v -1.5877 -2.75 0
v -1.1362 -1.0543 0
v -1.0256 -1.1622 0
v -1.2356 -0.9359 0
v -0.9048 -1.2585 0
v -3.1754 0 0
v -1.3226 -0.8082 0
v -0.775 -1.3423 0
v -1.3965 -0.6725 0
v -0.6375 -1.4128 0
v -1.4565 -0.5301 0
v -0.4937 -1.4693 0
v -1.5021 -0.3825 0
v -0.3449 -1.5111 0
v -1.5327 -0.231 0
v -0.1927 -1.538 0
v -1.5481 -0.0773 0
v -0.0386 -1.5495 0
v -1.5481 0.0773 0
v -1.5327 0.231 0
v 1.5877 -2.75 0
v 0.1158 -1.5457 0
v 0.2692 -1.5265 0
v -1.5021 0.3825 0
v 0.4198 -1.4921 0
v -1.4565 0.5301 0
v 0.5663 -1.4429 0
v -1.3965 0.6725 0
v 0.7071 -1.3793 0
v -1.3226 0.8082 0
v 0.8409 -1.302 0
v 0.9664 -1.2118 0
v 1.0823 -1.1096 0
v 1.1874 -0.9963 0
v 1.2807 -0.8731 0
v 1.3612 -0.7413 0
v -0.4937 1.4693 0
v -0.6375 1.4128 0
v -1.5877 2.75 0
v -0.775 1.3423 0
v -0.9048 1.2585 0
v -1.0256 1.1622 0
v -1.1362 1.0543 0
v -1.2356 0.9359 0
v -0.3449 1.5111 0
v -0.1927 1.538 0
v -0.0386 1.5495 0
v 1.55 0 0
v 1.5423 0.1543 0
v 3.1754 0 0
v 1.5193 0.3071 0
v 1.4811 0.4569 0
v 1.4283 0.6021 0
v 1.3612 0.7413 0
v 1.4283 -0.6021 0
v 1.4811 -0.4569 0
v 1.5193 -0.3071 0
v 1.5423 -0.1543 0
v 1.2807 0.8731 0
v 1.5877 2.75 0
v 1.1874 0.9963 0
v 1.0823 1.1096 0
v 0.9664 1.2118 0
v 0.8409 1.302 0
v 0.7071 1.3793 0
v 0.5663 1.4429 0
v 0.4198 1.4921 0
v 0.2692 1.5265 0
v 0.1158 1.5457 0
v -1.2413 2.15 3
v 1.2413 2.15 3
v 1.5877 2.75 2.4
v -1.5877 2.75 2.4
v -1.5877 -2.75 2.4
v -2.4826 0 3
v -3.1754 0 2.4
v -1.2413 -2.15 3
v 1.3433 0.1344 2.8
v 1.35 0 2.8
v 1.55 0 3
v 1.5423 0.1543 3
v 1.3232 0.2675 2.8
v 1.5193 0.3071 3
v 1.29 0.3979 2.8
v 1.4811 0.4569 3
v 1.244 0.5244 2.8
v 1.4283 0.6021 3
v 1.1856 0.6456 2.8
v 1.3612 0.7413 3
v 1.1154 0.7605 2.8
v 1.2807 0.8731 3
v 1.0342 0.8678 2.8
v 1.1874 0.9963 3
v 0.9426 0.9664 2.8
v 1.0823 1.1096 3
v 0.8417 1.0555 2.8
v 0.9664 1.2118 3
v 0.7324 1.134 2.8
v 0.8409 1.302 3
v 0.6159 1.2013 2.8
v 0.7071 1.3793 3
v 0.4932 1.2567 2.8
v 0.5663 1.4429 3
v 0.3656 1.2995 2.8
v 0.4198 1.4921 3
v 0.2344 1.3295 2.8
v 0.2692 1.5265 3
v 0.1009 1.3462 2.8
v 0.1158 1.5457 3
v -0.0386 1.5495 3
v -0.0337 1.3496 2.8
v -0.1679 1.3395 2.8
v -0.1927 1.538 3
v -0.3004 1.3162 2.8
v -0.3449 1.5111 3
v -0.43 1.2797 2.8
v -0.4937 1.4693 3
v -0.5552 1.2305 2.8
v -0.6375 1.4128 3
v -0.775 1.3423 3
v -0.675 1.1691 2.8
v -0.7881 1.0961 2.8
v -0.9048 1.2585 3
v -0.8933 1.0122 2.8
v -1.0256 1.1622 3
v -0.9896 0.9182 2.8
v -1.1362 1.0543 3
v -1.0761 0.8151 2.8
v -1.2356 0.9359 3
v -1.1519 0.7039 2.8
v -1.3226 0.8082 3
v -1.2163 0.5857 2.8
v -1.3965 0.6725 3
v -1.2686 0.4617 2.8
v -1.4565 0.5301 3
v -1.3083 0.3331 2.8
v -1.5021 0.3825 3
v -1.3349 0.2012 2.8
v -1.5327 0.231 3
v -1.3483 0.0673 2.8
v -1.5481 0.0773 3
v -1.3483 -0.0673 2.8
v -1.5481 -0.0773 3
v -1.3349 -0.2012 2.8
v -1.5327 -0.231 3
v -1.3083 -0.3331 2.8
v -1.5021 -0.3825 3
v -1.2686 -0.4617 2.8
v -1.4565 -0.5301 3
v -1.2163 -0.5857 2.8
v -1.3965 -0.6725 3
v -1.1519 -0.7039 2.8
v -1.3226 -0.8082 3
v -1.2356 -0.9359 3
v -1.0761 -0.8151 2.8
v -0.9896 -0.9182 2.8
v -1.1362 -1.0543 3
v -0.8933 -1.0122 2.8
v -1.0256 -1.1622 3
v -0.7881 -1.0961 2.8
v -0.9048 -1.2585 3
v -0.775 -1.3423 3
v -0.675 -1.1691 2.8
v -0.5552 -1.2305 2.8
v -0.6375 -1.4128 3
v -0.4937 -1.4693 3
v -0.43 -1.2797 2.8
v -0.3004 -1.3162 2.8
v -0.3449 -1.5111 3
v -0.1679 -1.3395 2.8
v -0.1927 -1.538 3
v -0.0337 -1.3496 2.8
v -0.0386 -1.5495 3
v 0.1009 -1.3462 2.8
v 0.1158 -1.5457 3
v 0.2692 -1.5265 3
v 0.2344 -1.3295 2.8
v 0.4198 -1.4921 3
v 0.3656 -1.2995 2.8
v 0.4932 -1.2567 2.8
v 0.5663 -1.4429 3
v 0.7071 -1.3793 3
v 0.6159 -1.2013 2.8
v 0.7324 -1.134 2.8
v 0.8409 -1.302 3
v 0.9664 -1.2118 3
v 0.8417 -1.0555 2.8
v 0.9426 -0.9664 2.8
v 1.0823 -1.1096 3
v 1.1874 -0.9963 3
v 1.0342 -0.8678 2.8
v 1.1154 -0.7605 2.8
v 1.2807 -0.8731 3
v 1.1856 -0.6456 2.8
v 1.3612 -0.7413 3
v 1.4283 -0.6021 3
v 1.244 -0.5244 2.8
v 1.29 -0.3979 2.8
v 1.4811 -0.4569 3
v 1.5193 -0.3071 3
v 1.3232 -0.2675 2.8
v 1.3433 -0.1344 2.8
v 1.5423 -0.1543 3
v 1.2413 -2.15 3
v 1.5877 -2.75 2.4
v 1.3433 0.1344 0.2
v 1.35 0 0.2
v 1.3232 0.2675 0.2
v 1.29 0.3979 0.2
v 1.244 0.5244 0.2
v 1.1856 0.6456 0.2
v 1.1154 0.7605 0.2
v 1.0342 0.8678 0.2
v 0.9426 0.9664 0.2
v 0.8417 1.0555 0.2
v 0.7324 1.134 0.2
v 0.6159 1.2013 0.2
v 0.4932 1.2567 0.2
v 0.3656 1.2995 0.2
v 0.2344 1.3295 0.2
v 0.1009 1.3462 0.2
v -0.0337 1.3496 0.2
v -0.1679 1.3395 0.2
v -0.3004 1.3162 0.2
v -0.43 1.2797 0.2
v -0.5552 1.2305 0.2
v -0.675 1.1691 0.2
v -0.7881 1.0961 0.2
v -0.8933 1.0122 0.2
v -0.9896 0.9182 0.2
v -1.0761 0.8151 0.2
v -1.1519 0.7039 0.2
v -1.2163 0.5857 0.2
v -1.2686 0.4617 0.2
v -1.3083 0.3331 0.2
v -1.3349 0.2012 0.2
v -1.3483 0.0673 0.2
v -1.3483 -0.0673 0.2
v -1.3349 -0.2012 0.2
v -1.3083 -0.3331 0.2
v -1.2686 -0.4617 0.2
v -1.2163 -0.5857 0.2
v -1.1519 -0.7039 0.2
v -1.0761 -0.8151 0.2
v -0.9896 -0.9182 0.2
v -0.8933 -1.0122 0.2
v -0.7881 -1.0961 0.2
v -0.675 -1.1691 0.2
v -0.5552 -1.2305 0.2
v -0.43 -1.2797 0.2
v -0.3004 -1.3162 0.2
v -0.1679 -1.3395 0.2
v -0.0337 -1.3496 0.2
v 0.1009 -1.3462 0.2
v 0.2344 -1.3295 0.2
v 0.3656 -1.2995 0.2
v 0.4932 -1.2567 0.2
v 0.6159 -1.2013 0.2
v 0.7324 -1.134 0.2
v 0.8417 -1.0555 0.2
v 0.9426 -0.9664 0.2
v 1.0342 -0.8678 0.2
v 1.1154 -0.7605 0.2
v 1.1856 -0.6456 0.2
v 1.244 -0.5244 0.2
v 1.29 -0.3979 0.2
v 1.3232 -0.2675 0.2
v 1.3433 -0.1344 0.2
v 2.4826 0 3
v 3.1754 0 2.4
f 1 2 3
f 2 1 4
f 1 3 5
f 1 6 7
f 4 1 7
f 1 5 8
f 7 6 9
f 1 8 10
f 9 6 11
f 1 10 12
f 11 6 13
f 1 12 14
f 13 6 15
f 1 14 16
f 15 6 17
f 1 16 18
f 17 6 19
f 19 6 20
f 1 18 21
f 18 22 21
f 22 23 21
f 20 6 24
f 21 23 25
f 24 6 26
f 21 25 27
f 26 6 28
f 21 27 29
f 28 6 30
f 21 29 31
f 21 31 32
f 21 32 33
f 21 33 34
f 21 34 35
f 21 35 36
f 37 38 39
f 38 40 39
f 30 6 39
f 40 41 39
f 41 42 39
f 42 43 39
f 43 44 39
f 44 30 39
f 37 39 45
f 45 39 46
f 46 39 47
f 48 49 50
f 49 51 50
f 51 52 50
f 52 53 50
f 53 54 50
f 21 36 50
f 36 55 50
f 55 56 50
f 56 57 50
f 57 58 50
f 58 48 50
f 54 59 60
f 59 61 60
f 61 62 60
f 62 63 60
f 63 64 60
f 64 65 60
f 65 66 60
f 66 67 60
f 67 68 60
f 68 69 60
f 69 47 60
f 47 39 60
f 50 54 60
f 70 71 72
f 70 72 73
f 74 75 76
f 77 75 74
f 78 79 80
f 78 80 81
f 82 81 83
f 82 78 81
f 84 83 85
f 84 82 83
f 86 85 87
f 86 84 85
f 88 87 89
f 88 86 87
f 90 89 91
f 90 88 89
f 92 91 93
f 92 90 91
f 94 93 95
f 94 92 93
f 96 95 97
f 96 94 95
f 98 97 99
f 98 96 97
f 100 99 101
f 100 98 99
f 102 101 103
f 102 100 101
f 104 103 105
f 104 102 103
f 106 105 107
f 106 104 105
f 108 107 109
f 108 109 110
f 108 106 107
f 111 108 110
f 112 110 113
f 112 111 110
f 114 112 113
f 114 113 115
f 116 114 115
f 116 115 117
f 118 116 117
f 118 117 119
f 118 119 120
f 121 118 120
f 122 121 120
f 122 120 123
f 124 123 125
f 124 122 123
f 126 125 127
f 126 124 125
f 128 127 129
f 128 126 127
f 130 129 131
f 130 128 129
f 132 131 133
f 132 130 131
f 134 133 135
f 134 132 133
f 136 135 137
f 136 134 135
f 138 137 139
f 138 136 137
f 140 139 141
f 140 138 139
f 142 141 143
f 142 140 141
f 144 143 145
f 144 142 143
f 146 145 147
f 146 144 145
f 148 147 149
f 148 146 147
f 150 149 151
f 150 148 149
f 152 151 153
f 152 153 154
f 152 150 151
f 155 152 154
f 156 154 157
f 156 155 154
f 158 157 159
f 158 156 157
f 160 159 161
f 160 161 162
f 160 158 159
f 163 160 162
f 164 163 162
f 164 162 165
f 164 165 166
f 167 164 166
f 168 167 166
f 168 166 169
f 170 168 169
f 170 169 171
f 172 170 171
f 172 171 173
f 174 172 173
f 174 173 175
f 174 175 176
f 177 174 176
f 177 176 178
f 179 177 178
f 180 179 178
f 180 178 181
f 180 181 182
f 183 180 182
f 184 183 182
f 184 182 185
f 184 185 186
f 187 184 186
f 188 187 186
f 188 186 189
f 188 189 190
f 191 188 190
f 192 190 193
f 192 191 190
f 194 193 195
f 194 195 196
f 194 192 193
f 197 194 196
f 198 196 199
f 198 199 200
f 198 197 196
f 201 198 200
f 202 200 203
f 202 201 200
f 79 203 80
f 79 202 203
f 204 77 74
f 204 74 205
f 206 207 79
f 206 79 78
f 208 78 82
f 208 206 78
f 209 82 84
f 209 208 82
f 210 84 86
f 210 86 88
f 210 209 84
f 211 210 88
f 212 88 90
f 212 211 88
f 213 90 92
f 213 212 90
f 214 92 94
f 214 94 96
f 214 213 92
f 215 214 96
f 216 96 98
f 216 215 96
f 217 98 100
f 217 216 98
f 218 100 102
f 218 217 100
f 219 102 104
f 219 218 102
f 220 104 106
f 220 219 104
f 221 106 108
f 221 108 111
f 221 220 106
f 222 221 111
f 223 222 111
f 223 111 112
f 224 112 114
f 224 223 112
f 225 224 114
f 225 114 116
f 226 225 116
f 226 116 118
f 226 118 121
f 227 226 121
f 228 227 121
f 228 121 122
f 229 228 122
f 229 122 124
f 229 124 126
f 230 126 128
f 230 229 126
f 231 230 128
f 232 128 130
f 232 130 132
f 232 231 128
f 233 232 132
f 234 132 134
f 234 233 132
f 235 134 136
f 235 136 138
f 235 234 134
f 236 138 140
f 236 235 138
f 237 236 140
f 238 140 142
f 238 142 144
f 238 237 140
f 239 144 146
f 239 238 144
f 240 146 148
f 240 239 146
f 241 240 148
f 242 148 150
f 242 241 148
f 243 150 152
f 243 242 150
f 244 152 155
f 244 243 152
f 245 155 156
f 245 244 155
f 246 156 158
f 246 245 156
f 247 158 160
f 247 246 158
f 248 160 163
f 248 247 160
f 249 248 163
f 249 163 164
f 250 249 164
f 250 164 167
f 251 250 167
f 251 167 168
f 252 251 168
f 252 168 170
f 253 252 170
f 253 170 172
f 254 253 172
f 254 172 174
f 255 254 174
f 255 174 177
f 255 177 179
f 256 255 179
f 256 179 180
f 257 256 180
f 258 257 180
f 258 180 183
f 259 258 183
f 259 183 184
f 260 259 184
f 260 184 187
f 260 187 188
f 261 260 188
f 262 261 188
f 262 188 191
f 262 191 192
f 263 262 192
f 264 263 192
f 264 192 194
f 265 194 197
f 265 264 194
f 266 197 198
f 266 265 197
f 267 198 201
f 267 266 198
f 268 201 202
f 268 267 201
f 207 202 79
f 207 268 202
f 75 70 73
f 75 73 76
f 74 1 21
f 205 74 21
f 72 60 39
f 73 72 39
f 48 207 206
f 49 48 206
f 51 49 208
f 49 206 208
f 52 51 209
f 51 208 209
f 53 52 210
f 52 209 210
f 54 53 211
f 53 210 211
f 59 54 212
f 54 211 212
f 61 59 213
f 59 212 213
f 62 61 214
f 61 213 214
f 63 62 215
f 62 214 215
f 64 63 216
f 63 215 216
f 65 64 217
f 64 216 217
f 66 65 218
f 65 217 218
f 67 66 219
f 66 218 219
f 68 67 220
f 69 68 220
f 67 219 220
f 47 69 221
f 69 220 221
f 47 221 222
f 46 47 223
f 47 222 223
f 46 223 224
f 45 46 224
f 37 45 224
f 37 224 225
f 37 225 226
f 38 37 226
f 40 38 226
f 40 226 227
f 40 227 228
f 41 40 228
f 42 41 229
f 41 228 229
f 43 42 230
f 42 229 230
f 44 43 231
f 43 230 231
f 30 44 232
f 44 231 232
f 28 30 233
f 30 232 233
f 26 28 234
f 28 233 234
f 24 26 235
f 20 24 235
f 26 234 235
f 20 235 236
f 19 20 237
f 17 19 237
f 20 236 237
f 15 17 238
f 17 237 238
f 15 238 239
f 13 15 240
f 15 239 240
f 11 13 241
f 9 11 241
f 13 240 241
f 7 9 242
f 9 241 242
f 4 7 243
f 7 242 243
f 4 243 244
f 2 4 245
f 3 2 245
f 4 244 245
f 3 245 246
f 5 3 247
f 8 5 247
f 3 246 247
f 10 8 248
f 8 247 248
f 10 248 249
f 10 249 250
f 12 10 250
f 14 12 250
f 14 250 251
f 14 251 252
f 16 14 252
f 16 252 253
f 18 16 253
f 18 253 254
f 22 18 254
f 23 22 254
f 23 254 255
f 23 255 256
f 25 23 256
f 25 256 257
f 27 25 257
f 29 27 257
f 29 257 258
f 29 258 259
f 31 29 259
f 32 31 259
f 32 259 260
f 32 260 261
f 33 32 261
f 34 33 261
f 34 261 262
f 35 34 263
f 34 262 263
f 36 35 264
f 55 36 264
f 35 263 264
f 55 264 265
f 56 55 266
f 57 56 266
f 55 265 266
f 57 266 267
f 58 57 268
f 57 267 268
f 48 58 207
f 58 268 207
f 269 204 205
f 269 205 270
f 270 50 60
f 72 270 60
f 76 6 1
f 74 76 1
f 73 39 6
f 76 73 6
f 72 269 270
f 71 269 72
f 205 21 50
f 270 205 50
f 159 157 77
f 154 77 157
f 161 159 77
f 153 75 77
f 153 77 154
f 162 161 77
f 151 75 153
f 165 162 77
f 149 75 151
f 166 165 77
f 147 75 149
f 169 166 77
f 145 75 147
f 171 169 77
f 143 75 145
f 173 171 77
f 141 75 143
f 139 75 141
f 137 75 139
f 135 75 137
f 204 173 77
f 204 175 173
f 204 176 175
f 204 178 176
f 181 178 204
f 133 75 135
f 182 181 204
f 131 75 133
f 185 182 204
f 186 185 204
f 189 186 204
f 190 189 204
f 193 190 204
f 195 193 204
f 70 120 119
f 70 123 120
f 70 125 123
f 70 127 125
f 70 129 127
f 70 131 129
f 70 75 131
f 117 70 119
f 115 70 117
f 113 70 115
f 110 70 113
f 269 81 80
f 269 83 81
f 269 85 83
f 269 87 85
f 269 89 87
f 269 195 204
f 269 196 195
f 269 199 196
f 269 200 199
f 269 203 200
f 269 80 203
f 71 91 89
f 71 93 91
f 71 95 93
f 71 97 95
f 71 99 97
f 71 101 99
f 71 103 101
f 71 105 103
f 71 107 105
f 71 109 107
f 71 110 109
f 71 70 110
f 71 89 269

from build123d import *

# Parameters (mm, degrees)
SKETCH_1_R      = 1.35
EXTRUDE_1_DEPTH = 3
CHAMFER_1_SIZE  = 0.6
CHAMFER_2_SIZE  = 0.2


with BuildPart() as part:
    # ｽｹｯﾁ1 → ﾎﾞｽ - 押し出し1 (new body)
    with BuildSketch(Plane.XY):
        Polygon((3.175426481, 0), (1.58771324, 2.75), (-1.58771324, 2.75), (-3.175426481, 0), (-1.58771324, -2.75), (1.58771324, -2.75), align=None)
        Circle(SKETCH_1_R, mode=Mode.SUBTRACT)
    extrude(amount=EXTRUDE_1_DEPTH)

    # 面取り1
    chamfer_1_edges = [part.edges().sort_by_distance(p)[0] for p in [
        (0, 2.75, 3),
        (-2.38156986, 1.375, 3),
        (-2.38156986, -1.375, 3),
        (0, -2.75, 3),
        (2.38156986, -1.375, 3),
        (2.38156986, 1.375, 3),
    ]]
    chamfer(chamfer_1_edges, length=CHAMFER_1_SIZE)

    # 面取り2
    chamfer_2_edges = [part.edges().sort_by_distance(p)[0] for p in [
        (-1.35, 0, 0),
        (-1.35, 0, 3),
    ]]
    chamfer(chamfer_2_edges, length=CHAMFER_2_SIZE)


solid = part.part
